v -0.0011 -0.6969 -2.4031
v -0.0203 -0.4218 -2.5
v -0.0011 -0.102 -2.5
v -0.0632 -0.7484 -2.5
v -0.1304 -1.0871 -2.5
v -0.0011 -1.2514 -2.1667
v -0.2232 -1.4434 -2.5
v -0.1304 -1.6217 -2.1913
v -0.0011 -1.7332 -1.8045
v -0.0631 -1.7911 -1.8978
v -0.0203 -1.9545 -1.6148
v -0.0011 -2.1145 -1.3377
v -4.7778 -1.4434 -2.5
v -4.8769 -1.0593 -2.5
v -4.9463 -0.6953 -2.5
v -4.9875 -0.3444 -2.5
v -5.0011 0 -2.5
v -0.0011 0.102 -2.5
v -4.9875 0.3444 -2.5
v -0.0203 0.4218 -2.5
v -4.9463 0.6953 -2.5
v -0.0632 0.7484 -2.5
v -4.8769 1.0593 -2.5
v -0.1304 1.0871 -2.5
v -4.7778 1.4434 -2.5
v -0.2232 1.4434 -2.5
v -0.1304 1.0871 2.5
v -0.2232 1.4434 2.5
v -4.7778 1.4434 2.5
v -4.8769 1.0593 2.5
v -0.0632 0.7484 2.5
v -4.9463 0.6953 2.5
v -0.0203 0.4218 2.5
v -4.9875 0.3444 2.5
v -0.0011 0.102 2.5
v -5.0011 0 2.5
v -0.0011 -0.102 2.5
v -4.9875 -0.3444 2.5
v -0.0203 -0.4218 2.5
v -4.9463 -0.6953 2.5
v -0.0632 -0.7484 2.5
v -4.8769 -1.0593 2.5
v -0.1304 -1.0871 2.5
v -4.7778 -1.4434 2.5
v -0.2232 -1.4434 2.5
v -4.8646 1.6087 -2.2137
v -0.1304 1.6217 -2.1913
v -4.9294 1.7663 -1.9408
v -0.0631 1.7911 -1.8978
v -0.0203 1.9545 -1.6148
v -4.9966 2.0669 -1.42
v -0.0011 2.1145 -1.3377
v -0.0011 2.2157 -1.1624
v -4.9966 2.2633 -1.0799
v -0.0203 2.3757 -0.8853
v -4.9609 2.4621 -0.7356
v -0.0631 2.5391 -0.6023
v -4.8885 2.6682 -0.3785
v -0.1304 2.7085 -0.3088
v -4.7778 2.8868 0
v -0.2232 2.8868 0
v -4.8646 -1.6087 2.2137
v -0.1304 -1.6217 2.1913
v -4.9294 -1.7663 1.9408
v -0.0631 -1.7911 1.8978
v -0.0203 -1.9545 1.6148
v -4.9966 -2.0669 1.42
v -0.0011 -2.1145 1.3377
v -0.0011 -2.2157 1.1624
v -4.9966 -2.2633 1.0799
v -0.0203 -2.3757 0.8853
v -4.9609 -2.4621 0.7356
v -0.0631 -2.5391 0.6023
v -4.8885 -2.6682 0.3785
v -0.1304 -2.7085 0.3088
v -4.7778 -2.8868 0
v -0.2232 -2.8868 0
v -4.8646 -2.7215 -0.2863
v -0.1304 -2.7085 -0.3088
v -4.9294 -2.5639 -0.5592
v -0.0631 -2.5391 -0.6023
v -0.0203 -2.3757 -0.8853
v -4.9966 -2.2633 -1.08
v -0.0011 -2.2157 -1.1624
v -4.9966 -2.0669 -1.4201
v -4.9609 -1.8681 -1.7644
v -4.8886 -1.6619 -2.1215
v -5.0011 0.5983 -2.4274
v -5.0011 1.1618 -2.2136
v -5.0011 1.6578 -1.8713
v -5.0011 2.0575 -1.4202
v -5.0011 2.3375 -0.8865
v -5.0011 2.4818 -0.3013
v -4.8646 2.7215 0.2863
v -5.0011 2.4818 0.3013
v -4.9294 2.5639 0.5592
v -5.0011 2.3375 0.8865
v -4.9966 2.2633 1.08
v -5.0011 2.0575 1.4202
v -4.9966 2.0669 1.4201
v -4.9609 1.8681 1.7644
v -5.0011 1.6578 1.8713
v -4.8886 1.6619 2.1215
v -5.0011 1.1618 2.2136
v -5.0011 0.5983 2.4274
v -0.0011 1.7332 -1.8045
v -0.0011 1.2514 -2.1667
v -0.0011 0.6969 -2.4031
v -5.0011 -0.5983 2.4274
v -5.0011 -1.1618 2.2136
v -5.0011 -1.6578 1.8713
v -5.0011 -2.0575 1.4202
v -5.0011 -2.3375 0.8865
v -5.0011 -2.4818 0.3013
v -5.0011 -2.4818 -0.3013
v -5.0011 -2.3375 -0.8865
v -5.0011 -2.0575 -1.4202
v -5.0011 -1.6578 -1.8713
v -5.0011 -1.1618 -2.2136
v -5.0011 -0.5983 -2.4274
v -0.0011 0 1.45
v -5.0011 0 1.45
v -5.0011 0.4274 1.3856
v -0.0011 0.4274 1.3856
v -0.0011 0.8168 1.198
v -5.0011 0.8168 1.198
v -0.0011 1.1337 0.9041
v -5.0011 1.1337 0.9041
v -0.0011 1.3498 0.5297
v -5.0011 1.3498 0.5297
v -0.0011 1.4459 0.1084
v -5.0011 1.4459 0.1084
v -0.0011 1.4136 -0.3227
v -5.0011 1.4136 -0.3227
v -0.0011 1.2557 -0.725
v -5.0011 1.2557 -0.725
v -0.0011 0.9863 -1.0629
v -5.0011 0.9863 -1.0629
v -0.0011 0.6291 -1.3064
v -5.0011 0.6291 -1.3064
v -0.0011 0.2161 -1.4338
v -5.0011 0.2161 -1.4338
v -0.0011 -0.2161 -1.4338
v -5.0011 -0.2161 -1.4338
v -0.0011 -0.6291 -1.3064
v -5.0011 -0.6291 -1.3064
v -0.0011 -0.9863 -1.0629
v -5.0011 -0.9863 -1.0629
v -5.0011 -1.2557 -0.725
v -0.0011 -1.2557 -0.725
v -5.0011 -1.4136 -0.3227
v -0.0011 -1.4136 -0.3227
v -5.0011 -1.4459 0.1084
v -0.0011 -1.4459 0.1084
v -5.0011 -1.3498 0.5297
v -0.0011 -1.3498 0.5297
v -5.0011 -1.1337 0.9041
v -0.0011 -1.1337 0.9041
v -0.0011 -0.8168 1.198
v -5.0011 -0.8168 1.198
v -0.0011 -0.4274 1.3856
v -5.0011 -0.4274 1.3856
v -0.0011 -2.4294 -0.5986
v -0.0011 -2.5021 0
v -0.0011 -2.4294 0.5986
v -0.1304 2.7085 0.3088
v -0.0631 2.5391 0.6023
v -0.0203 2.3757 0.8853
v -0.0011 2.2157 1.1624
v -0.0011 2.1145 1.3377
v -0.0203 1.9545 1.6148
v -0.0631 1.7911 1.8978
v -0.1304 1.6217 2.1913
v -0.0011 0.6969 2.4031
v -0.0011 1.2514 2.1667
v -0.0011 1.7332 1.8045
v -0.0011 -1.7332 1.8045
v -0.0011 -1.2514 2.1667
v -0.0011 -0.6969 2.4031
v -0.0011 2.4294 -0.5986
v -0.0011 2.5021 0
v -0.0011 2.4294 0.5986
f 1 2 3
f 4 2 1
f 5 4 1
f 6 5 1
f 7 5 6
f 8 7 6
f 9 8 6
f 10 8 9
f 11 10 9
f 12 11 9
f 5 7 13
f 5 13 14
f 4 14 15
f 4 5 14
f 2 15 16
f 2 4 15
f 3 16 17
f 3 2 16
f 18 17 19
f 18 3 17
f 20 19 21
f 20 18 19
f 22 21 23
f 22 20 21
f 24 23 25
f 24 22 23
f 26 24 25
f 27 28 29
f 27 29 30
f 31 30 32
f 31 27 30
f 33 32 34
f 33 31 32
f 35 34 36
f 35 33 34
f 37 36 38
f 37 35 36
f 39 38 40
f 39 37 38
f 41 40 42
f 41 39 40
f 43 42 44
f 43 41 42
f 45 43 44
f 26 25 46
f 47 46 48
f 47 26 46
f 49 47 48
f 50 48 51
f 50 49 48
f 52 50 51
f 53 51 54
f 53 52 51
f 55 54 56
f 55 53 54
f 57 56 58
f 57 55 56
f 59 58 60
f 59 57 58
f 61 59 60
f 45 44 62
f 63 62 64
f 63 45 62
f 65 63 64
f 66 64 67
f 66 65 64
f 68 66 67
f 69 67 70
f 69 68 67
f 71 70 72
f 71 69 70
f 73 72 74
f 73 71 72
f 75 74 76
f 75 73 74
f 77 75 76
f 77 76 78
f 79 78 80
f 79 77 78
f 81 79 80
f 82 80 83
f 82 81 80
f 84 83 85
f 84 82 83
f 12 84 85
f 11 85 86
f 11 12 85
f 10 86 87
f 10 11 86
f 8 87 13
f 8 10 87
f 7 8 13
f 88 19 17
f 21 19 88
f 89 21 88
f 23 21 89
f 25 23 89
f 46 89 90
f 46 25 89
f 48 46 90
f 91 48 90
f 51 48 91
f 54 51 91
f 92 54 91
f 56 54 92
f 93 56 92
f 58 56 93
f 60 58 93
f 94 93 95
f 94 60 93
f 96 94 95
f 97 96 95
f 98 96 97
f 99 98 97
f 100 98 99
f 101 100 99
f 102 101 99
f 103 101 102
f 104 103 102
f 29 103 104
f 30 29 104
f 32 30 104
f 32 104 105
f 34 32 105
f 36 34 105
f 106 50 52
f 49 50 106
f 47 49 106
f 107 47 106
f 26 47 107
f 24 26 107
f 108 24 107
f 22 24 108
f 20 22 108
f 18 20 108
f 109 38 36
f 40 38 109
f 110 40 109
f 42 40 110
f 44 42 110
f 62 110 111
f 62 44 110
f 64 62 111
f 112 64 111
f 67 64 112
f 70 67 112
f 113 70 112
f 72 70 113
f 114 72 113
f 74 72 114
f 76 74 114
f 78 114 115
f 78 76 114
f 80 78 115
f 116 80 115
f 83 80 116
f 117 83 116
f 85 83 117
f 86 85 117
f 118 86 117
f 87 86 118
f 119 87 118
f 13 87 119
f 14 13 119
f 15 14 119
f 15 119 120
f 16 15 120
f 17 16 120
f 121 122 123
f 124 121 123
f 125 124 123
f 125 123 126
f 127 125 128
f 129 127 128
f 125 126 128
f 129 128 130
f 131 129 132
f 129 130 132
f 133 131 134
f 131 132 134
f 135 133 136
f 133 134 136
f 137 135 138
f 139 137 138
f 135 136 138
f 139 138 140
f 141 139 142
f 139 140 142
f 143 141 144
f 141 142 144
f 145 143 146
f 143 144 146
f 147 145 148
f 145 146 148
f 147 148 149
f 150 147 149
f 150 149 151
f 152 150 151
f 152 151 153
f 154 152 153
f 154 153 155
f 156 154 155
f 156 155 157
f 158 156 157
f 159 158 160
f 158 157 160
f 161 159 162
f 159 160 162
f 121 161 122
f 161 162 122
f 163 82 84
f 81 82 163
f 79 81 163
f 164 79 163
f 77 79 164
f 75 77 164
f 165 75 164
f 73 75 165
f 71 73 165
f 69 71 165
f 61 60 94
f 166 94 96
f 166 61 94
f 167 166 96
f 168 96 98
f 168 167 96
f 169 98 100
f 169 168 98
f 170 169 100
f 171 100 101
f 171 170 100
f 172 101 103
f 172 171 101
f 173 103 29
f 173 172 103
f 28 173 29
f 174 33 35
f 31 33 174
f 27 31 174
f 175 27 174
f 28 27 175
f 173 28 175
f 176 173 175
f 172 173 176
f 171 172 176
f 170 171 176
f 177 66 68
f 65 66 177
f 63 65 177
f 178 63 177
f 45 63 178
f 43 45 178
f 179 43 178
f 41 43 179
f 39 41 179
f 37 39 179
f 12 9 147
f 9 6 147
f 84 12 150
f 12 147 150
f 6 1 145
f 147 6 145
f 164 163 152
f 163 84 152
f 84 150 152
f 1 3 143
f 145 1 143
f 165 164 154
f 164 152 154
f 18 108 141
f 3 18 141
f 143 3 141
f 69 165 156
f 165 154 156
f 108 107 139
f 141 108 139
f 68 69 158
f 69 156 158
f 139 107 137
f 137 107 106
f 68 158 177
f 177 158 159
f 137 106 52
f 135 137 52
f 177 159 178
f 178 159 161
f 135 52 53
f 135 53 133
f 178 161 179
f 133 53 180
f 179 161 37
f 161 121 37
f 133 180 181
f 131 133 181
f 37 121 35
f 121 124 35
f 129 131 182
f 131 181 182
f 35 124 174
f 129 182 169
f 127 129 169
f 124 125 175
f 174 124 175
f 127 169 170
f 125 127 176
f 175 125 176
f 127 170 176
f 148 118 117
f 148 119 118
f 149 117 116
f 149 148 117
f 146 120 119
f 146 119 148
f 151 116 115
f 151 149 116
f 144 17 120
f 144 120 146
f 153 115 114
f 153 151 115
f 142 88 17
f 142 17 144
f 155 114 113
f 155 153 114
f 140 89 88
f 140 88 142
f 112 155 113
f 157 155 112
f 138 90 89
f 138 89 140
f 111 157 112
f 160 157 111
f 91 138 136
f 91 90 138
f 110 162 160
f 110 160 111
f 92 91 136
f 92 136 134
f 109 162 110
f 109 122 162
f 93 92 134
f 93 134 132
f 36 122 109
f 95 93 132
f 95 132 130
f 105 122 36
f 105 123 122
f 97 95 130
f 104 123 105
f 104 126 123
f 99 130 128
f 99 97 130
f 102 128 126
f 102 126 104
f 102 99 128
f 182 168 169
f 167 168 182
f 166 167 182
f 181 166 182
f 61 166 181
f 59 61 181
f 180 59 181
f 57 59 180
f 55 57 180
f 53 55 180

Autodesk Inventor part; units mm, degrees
ref_plane "YZ Plane" through (0, 0, 0) normal (1, 0, 0) x (0, 1, 0)
sketch "Sketch1" plane through (0, 0, 0) normal (0, 0, 1) x (1, 0, 0)
  line L0 (0, 2.5) -> (0, 1.25)
  line L1 (1.3, 1.25) -> (6, 1.25)
  line L2 (6, 1.25) -> (6, 0)
  line L3 (6, 0) -> (-0.0011, 0)
  line L4 (-1.2013, 0) -> (7.2002, 0) projected
  line L5 (-0.0011, 0) -> (-0.0011, 2.5)
  line L6 (-0.0011, 2.5) -> (0, 2.5)
  line L7 (1.3, 1.25) -> (1.0238, 1.25)
  line L8 (1.0238, 1.25) -> (0, 1.25)
  line L9 (0, -0.5) -> (0, 3) projected
  dimension "d0" = 6
  dimension "d1" = 4.7
  dimension "d2" = 2.5
  dimension "d9" = 0.0011
  dimension "d10" = 5
  dimension "d13" = 0.2762
  dimension "d14" = 2.5
revolve "Body" add sketch "Sketch1" angle 360 about axis through (6, 0, 0) along (-1, 0, 0)
sketch "Sketch2" plane through (-0.0011, 0, 0) normal (-1, 0, 0) x (0, 0, 1)
  line L0 (0, 2.8868) -> (2.5, 1.4434)
  line L1 (2.5, 1.4434) -> (2.5, -1.4434)
  line L2 (2.5, -1.4434) -> (0, -2.8868)
  line L3 (0, -2.8868) -> (-2.5, -1.4434)
  line L4 (-2.5, -1.4434) -> (-2.5, 1.4434)
  line L5 (-2.5, 1.4434) -> (0, 2.8868)
  point P0 (0, 0)
  point P1 (0, 0)
  dimension "d11" = 5
extrude "Head" add sketch "Sketch2" along normal blind 5
sketch "Sketch4" plane through (0, 0, 0) normal (0, 0, 1) x (1, 0, 0)
  line L0 (-5.0011, 2.5) -> (-5.0011, 2.8868)
  line L1 (-5.0011, 2.8868) -> (-4.7778, 2.8868)
  line L2 (-4.7778, 2.8868) -> (-5.0011, 2.5)
  line L3 (-2.0399, 0) -> (0.3387, 0) projected
  line L4 (-0.0011, 2.8868) -> (-5.0011, 2.8868) projected
  line L5 (-5.0011, 1.4434) -> (-5.0011, 2.8868) projected
  line L6 (-0.0011, -2.8868) -> (-5.0011, -2.8868) projected
  line L7 (-0.0011, 2.1651) -> (-0.0011, 2.8868) projected
  line L8 (-0.0011, 2.8868) -> (-0.2244, 2.8868)
  dimension "d5" = 30
  dimension "d19" = 5
revolve "Chamfer1" cut sketch "Sketch4" angle 360 about axis through (-10, 0, 0) along (1, 0, 0)
thread "Thread" size "M2.5x0.45" class "6g" standard "ISO Metric profile" length 4.7
chamfer "Chamfer2" distance 0.2761 distance2 0.2762 1 edges at (6, -1.25, 0) measured on face at (6, -0.3871, 0.3429)
ref_plane "Work Plane1" through (1.525, 0, 0) normal (0, 0, 1) x (1, 0, 0)
sketch "Sketch7" plane through (-5.0011, 0, 0) normal (-1, 0, 0) x (0, 0, 1)
  circle A0 centre (0, 0) radius 1.45
  point P0 (0, 0)
  dimension "d59" = 2.9
extrude "Extrusion5" cut sketch "Sketch7" against normal blind 20
ref_plane "Work Plane2" through (-2.5005, 0, 0) normal (1, 0, 0) x (0, 0, -1)
mirror "Mirror1" about plane through (-2.5005, 0, 0) normal (1, 0, 0) of "Chamfer1"
equation "\"d11\" = SW"
equation "\"d15\" = GEL"
equation "\"d6\" = -0.5 * SPD + 0.5 * GD"
equation "\"d0\" = NLG"
equation "\"d1\" = GEL"
equation "\"d2\" = GD"
equation "\"d10\" = SD2"
equation "\"d14\" = BDM"
equation "\"d5\" = ANG1"
equation "\"d19\" = SW0"
equation "\"NLG\" = 6"
equation "\"GD\" = NND"
equation "\"BDM\" = NND"
equation "\"KOH\" = 1.7"
equation "\"GEL\" = 4.7"
equation "\"SW\" = 5"
equation "\"SW0\" = SW"
equation "\"SPD\" = NND - 1.2269 * PTC"
equation "\"SD2\" = SW"
equation "\"SD\" = 0.001"
equation "\"ANG1\" = 30deg"
equation "\"GAL\" = 0.61345 * PTC"
equation "\"GUL\" = 0.61345 * PTC"
equation "\"RR\" = 0.001"
equation "\"WFT\" = SD"
equation "\"GD1\" = THREADDIA - 1.2269 * PTC"
equation "\"THREADDIA\" = 2.5"
equation "\"SDH\" = SW"
equation "\"TOA\" = 30deg"
equation "\"FAWI\" = 45deg"
equation "\"PTC\" = 0.45"
equation "\"NND\" = 2.5"
equation "\"E0\" = 1.155 * SW"
properties part number "AS 1110 - M2.5 x 6" material "Steel, Mild"
